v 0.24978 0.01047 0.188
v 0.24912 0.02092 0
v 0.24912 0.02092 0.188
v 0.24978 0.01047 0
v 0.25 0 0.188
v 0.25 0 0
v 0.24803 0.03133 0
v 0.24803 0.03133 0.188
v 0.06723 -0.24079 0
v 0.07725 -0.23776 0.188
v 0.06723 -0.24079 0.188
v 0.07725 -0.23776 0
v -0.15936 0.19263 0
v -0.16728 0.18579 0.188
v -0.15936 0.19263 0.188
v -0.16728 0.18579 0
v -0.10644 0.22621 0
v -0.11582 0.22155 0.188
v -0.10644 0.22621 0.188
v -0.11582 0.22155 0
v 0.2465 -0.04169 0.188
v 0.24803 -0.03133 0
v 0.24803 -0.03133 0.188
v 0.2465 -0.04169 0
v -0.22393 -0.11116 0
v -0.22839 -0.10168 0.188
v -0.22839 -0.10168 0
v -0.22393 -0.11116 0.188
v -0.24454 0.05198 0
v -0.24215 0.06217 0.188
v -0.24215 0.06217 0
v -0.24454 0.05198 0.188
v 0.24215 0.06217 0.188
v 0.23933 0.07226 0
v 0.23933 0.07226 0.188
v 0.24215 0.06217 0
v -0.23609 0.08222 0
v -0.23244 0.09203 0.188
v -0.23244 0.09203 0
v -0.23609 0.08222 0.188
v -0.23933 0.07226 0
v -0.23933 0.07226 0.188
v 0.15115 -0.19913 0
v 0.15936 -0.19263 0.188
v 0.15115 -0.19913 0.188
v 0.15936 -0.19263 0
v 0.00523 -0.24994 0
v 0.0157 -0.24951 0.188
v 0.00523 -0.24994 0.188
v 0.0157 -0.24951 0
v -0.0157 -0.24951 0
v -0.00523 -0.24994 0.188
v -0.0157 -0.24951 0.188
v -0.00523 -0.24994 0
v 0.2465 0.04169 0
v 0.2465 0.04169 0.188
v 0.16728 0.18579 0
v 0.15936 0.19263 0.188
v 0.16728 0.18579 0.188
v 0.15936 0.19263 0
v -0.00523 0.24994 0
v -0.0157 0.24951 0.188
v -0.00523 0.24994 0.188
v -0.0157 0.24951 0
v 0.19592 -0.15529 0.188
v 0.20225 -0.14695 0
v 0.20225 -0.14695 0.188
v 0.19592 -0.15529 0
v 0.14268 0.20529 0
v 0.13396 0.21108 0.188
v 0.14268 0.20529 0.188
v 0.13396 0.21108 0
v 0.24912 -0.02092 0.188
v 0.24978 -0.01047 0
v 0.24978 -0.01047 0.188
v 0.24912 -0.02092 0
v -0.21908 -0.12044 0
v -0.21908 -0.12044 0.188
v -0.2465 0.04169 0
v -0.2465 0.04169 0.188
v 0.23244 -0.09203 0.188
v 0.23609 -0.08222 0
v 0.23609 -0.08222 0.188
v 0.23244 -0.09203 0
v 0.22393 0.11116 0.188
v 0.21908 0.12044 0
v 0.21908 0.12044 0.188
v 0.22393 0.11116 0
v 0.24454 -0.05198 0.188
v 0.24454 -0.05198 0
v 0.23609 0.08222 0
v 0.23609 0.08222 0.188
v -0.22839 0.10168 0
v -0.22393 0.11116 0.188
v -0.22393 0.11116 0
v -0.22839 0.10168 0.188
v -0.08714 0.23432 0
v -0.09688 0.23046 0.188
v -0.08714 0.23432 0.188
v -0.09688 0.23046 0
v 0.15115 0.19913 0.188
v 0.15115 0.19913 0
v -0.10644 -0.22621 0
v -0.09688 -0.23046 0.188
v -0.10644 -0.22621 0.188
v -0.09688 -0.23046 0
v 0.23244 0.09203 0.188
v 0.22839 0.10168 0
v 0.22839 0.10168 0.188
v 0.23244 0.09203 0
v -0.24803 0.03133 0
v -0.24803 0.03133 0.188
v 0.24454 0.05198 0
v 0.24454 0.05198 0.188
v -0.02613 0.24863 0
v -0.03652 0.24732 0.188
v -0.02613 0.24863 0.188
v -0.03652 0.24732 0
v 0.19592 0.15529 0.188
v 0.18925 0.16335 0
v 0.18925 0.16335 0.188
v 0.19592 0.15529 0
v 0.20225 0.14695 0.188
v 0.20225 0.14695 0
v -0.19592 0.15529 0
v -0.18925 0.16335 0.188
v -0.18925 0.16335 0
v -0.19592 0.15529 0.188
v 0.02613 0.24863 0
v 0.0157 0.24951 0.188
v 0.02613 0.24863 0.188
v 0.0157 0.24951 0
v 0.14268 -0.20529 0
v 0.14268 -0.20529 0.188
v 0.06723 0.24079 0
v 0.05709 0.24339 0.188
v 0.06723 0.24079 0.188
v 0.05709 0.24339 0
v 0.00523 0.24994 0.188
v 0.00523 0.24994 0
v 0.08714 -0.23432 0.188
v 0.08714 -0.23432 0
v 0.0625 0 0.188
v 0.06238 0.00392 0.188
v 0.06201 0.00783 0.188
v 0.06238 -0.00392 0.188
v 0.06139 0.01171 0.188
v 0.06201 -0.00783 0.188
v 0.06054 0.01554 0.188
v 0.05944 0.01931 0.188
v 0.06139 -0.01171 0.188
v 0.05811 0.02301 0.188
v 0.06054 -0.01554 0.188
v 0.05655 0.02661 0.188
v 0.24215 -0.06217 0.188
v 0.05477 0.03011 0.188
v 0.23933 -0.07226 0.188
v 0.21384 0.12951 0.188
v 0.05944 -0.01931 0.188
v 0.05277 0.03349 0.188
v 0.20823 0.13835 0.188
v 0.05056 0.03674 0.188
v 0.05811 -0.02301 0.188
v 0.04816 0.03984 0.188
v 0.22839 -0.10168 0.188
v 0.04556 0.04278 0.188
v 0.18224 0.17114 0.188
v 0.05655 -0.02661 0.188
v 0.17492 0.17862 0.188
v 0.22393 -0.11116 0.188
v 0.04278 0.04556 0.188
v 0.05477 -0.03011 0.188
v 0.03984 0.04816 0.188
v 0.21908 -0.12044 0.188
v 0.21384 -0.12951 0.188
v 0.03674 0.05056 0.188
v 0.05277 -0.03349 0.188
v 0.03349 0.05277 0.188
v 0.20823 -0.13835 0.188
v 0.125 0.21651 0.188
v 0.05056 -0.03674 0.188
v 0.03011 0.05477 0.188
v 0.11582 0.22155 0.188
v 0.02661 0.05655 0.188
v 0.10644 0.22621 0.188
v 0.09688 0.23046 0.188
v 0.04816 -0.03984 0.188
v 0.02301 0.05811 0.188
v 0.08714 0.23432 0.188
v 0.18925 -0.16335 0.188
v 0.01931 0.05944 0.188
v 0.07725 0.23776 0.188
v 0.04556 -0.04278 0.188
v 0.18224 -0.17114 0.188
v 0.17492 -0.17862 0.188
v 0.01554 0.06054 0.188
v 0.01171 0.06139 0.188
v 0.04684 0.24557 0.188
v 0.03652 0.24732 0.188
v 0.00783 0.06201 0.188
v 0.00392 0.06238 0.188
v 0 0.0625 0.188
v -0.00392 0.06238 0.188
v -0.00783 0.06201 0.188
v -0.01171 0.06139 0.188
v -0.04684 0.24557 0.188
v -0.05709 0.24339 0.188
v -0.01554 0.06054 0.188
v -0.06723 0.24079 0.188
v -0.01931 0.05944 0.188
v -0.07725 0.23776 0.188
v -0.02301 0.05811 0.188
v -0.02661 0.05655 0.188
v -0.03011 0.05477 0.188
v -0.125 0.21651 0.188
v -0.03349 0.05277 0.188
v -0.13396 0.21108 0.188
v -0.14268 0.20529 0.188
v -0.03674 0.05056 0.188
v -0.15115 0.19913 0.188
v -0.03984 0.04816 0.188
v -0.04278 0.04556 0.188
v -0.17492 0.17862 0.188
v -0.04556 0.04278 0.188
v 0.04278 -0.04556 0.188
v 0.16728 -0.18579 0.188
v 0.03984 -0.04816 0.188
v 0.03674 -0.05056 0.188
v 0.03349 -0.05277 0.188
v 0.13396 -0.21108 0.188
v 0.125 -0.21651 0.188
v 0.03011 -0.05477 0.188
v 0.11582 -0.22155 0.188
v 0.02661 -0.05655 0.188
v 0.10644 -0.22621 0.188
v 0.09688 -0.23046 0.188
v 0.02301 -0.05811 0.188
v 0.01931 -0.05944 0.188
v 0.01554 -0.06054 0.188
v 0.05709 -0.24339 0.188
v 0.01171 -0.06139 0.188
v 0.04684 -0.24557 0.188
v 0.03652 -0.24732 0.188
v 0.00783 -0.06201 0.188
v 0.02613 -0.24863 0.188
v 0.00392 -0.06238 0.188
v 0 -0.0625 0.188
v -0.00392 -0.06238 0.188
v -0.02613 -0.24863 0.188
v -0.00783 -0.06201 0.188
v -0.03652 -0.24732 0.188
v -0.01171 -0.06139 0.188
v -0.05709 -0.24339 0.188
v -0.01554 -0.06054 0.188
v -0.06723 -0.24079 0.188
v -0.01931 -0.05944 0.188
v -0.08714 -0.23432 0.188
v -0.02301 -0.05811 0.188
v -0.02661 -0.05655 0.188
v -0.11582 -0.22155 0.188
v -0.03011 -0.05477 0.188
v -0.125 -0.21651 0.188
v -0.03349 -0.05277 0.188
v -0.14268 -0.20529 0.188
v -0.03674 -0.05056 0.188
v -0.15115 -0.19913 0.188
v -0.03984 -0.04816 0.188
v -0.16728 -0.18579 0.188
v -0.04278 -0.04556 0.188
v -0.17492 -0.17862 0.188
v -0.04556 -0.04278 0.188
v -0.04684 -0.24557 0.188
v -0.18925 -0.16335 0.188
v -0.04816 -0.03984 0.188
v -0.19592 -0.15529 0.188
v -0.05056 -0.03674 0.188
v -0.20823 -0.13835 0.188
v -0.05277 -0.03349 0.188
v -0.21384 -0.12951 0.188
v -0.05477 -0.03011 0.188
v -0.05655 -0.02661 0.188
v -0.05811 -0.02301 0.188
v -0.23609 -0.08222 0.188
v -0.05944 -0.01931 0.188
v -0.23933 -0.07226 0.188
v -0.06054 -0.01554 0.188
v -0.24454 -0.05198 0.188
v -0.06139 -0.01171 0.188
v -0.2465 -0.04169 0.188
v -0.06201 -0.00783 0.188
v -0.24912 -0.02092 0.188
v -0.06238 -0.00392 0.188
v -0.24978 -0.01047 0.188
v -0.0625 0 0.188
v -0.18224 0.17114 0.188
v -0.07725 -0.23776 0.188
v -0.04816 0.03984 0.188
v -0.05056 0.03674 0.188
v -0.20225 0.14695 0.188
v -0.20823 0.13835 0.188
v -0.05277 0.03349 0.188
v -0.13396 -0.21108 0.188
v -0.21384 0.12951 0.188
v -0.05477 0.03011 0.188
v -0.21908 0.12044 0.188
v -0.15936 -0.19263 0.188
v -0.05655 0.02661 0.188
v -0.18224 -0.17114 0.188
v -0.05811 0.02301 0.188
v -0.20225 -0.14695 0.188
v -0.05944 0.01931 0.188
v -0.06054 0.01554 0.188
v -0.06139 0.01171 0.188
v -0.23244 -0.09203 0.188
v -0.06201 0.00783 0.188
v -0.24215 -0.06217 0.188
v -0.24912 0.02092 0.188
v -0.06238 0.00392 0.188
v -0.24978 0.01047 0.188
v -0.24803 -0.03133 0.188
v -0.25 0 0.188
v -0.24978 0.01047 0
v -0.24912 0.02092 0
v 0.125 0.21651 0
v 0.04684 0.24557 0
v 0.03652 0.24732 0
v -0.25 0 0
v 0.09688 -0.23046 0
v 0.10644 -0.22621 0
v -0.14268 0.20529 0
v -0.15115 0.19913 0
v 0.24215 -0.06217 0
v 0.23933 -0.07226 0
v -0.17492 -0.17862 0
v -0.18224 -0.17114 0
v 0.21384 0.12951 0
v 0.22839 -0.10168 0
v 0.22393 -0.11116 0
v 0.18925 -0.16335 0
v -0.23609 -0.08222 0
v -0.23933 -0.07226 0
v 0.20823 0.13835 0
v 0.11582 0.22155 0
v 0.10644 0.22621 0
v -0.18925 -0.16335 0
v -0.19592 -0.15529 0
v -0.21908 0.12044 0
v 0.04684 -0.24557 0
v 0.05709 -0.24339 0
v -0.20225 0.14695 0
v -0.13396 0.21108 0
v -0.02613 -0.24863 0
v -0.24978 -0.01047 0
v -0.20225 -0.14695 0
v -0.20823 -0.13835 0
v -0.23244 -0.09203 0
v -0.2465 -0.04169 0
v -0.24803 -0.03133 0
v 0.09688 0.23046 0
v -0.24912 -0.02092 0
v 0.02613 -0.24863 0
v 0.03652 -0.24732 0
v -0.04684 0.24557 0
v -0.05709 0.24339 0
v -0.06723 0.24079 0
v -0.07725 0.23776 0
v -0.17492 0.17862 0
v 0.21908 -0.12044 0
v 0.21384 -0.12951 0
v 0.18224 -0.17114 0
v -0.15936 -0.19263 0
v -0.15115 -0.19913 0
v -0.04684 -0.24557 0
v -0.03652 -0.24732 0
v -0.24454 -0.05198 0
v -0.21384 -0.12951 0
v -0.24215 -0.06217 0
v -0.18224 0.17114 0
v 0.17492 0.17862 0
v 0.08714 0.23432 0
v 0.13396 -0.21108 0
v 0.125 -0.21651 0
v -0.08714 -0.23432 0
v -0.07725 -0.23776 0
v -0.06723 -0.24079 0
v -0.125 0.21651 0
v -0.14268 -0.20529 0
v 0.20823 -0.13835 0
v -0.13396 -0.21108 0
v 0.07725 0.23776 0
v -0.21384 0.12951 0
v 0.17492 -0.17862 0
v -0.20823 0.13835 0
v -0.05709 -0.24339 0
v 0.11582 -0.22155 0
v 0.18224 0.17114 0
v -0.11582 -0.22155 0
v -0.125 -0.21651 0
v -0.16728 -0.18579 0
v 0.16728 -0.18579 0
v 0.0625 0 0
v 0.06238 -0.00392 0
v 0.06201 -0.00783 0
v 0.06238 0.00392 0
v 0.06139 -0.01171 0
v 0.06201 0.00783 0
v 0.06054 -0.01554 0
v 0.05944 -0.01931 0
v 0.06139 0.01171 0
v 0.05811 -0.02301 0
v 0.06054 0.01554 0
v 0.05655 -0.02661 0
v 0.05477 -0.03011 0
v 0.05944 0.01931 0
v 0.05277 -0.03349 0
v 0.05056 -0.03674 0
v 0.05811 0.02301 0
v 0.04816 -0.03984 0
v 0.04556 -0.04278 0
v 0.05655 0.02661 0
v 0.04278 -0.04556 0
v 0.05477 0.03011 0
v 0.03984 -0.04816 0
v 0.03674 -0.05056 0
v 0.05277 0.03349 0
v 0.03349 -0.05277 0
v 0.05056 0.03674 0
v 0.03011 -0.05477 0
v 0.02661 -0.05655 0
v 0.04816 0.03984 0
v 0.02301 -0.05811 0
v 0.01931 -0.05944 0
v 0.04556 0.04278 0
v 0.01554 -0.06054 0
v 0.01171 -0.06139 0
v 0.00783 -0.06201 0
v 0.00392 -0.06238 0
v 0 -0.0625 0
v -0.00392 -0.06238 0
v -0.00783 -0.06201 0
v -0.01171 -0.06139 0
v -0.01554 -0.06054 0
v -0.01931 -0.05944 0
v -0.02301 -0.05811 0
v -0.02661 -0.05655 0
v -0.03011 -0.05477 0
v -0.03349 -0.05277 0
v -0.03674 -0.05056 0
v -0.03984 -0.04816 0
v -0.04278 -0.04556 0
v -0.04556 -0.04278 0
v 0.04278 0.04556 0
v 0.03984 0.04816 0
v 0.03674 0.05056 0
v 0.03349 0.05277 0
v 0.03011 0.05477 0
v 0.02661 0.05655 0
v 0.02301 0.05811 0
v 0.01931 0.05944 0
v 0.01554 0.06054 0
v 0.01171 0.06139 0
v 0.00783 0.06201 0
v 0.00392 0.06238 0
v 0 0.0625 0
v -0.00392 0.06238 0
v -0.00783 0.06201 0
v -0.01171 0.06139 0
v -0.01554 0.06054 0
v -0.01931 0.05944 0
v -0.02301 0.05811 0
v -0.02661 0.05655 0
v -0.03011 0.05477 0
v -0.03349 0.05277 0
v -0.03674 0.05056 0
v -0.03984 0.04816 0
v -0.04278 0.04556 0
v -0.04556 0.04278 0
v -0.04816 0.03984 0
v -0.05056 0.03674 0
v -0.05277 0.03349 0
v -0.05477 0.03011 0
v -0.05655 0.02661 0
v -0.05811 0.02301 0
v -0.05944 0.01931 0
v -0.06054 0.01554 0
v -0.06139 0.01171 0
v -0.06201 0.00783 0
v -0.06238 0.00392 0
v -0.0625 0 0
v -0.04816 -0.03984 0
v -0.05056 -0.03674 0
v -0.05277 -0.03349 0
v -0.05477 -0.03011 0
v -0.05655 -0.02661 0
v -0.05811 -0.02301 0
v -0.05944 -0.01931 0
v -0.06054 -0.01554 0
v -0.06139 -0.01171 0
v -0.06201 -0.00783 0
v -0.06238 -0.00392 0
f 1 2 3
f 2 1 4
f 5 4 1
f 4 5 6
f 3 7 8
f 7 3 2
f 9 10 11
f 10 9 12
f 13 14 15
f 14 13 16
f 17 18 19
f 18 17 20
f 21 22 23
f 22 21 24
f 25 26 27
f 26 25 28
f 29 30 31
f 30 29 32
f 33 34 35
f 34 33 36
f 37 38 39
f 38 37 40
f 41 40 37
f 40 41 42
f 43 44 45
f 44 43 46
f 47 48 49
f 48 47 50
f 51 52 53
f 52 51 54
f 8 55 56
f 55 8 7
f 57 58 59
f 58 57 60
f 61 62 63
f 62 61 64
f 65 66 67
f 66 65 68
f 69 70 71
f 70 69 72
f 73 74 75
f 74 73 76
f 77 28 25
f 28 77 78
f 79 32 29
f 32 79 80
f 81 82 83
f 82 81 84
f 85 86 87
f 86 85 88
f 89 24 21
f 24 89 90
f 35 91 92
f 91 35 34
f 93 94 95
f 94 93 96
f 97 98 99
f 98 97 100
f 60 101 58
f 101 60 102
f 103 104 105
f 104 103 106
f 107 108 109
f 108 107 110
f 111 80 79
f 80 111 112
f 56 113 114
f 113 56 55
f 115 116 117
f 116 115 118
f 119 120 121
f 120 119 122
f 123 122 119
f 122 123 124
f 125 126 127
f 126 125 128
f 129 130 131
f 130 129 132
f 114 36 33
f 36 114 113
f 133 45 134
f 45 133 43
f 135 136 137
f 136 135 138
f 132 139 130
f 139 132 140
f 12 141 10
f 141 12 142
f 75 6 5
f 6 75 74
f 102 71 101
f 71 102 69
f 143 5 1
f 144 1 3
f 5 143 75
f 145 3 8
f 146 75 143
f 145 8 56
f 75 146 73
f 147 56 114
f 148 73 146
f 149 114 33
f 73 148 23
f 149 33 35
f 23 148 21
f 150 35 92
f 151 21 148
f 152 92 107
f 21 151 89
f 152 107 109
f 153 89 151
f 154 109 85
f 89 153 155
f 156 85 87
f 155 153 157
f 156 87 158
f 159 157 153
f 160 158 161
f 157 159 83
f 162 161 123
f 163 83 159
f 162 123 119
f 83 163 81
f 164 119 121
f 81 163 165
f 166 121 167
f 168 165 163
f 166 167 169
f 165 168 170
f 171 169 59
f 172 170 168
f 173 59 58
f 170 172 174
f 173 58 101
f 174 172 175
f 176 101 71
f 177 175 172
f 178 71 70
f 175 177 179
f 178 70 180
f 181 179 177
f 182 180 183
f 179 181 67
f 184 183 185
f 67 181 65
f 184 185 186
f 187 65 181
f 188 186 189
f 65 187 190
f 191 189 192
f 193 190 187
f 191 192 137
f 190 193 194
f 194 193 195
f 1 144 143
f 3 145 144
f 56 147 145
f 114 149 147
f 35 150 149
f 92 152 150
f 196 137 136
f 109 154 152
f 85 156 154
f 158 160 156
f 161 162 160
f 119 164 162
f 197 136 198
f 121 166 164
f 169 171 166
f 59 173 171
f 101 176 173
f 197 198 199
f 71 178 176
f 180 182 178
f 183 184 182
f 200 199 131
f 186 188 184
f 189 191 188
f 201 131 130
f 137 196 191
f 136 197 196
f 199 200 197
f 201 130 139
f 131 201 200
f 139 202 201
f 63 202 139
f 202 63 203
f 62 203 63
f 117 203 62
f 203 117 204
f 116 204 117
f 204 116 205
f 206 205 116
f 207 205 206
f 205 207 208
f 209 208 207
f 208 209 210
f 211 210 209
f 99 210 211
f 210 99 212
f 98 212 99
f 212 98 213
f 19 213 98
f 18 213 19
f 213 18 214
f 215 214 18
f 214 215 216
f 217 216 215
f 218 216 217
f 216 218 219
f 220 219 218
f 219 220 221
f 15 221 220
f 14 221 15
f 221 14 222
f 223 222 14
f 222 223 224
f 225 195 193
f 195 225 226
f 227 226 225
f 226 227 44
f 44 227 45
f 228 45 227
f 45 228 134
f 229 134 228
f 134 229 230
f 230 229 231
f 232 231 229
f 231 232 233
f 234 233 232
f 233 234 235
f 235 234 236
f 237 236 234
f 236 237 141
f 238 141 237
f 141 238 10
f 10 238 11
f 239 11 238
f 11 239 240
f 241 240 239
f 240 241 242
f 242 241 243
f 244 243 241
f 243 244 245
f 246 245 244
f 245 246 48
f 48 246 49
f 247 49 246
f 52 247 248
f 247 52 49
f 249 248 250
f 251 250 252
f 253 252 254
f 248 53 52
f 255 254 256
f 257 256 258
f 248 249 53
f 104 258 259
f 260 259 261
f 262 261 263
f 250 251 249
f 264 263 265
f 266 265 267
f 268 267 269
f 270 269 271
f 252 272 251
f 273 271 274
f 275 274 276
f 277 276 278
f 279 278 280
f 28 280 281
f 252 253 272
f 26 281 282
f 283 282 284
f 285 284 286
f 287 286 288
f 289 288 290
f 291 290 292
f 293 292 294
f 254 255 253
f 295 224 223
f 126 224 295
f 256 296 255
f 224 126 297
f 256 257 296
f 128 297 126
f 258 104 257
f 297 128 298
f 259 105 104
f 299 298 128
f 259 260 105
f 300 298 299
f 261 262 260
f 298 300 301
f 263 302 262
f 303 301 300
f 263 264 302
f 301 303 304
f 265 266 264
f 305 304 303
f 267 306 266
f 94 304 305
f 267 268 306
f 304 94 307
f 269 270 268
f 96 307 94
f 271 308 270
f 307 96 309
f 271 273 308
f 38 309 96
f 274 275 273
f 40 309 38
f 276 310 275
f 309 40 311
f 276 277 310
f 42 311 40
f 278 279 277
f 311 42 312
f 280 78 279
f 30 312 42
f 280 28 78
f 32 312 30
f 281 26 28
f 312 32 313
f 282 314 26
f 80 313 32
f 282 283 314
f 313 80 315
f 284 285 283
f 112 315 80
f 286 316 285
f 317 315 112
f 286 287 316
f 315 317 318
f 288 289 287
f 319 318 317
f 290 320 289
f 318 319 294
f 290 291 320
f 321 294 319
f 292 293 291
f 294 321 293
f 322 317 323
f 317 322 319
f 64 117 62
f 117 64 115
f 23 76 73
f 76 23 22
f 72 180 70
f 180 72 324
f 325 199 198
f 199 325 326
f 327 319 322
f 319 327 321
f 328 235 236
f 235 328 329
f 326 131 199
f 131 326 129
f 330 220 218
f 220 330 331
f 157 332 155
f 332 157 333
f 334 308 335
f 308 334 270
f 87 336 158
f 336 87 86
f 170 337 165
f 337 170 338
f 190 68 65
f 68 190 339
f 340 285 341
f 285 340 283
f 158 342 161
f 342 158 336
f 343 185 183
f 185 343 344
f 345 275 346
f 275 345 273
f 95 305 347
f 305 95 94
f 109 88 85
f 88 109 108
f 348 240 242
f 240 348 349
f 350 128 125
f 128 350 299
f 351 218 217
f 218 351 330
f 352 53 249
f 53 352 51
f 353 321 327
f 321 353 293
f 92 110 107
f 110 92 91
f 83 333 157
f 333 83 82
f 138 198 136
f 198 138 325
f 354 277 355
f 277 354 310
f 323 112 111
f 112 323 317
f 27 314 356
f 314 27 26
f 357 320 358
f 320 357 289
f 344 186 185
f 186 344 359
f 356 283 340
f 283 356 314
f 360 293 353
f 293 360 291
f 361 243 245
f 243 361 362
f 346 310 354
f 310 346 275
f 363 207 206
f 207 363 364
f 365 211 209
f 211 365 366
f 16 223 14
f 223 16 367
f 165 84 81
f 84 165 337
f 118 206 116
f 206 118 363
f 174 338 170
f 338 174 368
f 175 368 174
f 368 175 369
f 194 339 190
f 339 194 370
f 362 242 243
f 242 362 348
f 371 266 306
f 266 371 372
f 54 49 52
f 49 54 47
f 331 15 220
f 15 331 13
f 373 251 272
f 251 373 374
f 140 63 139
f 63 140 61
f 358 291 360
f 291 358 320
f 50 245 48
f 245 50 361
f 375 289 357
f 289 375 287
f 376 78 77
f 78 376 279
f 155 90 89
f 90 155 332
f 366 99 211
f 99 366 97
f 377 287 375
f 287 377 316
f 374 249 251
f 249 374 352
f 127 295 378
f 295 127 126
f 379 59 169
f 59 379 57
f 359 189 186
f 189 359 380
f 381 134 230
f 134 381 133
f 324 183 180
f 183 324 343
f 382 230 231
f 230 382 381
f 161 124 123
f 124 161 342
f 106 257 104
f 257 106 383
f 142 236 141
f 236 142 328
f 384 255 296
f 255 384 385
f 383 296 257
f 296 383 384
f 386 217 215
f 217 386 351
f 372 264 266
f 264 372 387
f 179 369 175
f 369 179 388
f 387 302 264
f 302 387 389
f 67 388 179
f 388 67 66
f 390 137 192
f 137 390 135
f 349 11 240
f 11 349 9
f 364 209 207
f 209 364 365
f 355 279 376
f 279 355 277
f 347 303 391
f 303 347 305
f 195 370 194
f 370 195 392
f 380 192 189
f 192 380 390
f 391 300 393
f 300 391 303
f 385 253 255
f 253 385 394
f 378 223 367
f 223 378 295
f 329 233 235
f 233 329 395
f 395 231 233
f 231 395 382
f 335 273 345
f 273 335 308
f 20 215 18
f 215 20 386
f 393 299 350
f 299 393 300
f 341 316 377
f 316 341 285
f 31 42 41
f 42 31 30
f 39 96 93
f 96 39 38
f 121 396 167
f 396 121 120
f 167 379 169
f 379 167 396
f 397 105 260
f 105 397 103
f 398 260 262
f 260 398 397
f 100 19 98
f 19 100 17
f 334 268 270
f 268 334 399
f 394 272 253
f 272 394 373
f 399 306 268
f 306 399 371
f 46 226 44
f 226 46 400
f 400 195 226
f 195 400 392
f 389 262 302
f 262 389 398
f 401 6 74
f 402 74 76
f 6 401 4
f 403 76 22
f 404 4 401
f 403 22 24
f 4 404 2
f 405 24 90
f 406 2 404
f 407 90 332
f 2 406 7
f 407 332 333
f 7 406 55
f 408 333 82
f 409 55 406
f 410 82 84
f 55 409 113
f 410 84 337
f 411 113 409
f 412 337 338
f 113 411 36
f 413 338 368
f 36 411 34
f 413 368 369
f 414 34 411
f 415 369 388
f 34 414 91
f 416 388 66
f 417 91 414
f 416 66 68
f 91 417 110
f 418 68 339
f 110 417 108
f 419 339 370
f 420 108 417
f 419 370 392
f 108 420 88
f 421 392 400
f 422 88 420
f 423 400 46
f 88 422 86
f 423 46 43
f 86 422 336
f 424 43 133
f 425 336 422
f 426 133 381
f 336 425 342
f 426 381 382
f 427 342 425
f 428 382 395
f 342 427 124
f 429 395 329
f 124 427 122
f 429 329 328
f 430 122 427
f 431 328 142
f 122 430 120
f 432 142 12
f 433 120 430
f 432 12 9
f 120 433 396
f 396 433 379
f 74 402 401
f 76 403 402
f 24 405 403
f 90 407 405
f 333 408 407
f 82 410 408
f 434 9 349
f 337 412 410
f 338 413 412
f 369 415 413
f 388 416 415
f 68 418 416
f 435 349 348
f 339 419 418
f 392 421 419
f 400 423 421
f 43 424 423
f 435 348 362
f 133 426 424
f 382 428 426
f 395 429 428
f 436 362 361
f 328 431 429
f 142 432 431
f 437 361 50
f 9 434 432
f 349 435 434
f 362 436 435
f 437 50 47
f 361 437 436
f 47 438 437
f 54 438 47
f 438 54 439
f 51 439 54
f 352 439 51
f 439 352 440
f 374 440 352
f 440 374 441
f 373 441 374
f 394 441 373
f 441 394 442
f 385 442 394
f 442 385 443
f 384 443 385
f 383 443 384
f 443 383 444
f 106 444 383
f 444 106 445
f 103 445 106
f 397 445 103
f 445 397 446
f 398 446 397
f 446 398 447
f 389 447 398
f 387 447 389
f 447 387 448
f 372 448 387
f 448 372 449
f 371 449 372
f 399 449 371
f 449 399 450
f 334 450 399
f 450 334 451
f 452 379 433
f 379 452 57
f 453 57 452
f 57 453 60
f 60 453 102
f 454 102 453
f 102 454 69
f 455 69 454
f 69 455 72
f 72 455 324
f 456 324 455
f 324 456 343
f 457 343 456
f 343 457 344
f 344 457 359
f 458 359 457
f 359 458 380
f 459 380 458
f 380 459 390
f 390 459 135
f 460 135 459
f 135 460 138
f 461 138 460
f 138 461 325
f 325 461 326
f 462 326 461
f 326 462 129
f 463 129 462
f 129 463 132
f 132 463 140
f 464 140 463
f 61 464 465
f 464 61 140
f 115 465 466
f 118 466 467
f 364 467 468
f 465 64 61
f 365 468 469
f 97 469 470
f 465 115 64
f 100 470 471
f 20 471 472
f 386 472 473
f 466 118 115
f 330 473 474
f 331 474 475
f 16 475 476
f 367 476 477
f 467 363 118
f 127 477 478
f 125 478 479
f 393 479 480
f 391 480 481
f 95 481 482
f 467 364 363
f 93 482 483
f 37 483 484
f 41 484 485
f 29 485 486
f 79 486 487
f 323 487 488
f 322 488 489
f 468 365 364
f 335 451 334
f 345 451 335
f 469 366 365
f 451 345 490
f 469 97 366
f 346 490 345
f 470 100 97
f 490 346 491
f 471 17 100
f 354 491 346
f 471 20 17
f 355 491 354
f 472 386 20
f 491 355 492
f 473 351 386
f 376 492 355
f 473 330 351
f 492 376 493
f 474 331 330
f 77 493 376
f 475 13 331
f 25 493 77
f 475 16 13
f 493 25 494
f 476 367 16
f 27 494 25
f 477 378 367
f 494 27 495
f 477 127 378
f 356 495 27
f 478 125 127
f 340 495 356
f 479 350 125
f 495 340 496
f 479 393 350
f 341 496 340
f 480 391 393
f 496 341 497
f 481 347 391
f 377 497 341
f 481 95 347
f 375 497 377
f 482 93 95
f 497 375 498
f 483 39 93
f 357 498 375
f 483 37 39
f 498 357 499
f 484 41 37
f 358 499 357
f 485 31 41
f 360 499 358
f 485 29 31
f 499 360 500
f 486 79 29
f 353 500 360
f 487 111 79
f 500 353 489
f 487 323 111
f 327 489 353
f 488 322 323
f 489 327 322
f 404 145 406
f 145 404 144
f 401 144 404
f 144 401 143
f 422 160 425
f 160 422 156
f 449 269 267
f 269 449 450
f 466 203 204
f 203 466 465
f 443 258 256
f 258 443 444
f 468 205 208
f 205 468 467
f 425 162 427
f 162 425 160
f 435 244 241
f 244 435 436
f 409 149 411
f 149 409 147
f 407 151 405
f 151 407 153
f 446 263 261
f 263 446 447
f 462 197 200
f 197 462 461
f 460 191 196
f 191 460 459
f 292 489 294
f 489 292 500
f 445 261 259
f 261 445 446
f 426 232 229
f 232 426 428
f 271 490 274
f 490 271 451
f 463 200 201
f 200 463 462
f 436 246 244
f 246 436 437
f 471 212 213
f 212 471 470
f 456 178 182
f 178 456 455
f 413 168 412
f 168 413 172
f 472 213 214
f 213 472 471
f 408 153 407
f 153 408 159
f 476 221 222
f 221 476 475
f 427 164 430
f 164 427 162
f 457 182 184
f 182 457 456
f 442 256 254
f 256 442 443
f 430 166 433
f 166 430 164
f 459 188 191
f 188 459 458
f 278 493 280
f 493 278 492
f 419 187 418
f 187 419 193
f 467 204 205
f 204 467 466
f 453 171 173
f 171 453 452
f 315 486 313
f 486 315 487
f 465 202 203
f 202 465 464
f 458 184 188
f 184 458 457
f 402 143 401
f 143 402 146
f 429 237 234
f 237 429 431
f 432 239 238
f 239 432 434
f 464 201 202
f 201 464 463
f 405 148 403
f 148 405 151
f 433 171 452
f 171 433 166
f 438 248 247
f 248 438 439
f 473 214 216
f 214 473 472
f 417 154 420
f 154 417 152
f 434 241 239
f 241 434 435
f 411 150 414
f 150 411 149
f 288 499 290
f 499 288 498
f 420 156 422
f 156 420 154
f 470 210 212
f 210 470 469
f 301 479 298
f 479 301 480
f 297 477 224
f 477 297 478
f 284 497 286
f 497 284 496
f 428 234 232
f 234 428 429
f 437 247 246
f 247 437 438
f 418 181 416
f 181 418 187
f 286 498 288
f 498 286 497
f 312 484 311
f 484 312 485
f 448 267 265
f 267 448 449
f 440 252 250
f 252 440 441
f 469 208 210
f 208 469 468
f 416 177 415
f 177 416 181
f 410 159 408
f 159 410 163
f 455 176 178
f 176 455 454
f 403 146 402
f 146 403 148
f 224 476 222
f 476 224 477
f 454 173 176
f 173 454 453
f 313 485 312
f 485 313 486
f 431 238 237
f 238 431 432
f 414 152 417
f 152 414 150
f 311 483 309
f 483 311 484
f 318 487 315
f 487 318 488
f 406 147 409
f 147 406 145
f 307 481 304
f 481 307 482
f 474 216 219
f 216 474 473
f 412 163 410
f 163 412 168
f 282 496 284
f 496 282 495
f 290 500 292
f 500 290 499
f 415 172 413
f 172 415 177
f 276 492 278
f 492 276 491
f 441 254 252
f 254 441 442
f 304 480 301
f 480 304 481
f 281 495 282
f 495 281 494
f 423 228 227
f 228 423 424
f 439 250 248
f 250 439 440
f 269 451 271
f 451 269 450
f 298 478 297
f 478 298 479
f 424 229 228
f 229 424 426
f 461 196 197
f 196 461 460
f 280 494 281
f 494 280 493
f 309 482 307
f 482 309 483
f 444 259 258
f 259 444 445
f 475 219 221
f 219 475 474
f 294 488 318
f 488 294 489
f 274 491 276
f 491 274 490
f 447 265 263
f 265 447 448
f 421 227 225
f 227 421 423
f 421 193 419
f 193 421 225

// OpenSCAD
// Gear40
//
// Tooth spacing 2.500 mm
// Contact angle 20 degrees
// Addendum 0.250 mm
// Diametric pitch 1.257 1/mm
// Pitch diameter 31.831 mm
// Overall diameter 32.92 mm
// Shaft spacing 19.099 mm (to 8 tooth gear)

drawingPositionIN = 20/25.4;

difference() {
  union () {
    // Gear body
    translate([-drawingPositionIN, -drawingPositionIN, 0])
      linear_extrude(height = 0.125, center = false, convexity = 25, slices = 5)
                     import(file = "Gear40and8.dxf", scale = 1/25.4, layer="Gear40");

    // Gear hub
    translate([0, 0, 0])
      cylinder(h = 0.188, d = 0.500, center = false, $fn = 150);
  }

  // idle bar hole
  cylinder(h = 2.0, d = 0.125, center = true, $fn = 100);
}
